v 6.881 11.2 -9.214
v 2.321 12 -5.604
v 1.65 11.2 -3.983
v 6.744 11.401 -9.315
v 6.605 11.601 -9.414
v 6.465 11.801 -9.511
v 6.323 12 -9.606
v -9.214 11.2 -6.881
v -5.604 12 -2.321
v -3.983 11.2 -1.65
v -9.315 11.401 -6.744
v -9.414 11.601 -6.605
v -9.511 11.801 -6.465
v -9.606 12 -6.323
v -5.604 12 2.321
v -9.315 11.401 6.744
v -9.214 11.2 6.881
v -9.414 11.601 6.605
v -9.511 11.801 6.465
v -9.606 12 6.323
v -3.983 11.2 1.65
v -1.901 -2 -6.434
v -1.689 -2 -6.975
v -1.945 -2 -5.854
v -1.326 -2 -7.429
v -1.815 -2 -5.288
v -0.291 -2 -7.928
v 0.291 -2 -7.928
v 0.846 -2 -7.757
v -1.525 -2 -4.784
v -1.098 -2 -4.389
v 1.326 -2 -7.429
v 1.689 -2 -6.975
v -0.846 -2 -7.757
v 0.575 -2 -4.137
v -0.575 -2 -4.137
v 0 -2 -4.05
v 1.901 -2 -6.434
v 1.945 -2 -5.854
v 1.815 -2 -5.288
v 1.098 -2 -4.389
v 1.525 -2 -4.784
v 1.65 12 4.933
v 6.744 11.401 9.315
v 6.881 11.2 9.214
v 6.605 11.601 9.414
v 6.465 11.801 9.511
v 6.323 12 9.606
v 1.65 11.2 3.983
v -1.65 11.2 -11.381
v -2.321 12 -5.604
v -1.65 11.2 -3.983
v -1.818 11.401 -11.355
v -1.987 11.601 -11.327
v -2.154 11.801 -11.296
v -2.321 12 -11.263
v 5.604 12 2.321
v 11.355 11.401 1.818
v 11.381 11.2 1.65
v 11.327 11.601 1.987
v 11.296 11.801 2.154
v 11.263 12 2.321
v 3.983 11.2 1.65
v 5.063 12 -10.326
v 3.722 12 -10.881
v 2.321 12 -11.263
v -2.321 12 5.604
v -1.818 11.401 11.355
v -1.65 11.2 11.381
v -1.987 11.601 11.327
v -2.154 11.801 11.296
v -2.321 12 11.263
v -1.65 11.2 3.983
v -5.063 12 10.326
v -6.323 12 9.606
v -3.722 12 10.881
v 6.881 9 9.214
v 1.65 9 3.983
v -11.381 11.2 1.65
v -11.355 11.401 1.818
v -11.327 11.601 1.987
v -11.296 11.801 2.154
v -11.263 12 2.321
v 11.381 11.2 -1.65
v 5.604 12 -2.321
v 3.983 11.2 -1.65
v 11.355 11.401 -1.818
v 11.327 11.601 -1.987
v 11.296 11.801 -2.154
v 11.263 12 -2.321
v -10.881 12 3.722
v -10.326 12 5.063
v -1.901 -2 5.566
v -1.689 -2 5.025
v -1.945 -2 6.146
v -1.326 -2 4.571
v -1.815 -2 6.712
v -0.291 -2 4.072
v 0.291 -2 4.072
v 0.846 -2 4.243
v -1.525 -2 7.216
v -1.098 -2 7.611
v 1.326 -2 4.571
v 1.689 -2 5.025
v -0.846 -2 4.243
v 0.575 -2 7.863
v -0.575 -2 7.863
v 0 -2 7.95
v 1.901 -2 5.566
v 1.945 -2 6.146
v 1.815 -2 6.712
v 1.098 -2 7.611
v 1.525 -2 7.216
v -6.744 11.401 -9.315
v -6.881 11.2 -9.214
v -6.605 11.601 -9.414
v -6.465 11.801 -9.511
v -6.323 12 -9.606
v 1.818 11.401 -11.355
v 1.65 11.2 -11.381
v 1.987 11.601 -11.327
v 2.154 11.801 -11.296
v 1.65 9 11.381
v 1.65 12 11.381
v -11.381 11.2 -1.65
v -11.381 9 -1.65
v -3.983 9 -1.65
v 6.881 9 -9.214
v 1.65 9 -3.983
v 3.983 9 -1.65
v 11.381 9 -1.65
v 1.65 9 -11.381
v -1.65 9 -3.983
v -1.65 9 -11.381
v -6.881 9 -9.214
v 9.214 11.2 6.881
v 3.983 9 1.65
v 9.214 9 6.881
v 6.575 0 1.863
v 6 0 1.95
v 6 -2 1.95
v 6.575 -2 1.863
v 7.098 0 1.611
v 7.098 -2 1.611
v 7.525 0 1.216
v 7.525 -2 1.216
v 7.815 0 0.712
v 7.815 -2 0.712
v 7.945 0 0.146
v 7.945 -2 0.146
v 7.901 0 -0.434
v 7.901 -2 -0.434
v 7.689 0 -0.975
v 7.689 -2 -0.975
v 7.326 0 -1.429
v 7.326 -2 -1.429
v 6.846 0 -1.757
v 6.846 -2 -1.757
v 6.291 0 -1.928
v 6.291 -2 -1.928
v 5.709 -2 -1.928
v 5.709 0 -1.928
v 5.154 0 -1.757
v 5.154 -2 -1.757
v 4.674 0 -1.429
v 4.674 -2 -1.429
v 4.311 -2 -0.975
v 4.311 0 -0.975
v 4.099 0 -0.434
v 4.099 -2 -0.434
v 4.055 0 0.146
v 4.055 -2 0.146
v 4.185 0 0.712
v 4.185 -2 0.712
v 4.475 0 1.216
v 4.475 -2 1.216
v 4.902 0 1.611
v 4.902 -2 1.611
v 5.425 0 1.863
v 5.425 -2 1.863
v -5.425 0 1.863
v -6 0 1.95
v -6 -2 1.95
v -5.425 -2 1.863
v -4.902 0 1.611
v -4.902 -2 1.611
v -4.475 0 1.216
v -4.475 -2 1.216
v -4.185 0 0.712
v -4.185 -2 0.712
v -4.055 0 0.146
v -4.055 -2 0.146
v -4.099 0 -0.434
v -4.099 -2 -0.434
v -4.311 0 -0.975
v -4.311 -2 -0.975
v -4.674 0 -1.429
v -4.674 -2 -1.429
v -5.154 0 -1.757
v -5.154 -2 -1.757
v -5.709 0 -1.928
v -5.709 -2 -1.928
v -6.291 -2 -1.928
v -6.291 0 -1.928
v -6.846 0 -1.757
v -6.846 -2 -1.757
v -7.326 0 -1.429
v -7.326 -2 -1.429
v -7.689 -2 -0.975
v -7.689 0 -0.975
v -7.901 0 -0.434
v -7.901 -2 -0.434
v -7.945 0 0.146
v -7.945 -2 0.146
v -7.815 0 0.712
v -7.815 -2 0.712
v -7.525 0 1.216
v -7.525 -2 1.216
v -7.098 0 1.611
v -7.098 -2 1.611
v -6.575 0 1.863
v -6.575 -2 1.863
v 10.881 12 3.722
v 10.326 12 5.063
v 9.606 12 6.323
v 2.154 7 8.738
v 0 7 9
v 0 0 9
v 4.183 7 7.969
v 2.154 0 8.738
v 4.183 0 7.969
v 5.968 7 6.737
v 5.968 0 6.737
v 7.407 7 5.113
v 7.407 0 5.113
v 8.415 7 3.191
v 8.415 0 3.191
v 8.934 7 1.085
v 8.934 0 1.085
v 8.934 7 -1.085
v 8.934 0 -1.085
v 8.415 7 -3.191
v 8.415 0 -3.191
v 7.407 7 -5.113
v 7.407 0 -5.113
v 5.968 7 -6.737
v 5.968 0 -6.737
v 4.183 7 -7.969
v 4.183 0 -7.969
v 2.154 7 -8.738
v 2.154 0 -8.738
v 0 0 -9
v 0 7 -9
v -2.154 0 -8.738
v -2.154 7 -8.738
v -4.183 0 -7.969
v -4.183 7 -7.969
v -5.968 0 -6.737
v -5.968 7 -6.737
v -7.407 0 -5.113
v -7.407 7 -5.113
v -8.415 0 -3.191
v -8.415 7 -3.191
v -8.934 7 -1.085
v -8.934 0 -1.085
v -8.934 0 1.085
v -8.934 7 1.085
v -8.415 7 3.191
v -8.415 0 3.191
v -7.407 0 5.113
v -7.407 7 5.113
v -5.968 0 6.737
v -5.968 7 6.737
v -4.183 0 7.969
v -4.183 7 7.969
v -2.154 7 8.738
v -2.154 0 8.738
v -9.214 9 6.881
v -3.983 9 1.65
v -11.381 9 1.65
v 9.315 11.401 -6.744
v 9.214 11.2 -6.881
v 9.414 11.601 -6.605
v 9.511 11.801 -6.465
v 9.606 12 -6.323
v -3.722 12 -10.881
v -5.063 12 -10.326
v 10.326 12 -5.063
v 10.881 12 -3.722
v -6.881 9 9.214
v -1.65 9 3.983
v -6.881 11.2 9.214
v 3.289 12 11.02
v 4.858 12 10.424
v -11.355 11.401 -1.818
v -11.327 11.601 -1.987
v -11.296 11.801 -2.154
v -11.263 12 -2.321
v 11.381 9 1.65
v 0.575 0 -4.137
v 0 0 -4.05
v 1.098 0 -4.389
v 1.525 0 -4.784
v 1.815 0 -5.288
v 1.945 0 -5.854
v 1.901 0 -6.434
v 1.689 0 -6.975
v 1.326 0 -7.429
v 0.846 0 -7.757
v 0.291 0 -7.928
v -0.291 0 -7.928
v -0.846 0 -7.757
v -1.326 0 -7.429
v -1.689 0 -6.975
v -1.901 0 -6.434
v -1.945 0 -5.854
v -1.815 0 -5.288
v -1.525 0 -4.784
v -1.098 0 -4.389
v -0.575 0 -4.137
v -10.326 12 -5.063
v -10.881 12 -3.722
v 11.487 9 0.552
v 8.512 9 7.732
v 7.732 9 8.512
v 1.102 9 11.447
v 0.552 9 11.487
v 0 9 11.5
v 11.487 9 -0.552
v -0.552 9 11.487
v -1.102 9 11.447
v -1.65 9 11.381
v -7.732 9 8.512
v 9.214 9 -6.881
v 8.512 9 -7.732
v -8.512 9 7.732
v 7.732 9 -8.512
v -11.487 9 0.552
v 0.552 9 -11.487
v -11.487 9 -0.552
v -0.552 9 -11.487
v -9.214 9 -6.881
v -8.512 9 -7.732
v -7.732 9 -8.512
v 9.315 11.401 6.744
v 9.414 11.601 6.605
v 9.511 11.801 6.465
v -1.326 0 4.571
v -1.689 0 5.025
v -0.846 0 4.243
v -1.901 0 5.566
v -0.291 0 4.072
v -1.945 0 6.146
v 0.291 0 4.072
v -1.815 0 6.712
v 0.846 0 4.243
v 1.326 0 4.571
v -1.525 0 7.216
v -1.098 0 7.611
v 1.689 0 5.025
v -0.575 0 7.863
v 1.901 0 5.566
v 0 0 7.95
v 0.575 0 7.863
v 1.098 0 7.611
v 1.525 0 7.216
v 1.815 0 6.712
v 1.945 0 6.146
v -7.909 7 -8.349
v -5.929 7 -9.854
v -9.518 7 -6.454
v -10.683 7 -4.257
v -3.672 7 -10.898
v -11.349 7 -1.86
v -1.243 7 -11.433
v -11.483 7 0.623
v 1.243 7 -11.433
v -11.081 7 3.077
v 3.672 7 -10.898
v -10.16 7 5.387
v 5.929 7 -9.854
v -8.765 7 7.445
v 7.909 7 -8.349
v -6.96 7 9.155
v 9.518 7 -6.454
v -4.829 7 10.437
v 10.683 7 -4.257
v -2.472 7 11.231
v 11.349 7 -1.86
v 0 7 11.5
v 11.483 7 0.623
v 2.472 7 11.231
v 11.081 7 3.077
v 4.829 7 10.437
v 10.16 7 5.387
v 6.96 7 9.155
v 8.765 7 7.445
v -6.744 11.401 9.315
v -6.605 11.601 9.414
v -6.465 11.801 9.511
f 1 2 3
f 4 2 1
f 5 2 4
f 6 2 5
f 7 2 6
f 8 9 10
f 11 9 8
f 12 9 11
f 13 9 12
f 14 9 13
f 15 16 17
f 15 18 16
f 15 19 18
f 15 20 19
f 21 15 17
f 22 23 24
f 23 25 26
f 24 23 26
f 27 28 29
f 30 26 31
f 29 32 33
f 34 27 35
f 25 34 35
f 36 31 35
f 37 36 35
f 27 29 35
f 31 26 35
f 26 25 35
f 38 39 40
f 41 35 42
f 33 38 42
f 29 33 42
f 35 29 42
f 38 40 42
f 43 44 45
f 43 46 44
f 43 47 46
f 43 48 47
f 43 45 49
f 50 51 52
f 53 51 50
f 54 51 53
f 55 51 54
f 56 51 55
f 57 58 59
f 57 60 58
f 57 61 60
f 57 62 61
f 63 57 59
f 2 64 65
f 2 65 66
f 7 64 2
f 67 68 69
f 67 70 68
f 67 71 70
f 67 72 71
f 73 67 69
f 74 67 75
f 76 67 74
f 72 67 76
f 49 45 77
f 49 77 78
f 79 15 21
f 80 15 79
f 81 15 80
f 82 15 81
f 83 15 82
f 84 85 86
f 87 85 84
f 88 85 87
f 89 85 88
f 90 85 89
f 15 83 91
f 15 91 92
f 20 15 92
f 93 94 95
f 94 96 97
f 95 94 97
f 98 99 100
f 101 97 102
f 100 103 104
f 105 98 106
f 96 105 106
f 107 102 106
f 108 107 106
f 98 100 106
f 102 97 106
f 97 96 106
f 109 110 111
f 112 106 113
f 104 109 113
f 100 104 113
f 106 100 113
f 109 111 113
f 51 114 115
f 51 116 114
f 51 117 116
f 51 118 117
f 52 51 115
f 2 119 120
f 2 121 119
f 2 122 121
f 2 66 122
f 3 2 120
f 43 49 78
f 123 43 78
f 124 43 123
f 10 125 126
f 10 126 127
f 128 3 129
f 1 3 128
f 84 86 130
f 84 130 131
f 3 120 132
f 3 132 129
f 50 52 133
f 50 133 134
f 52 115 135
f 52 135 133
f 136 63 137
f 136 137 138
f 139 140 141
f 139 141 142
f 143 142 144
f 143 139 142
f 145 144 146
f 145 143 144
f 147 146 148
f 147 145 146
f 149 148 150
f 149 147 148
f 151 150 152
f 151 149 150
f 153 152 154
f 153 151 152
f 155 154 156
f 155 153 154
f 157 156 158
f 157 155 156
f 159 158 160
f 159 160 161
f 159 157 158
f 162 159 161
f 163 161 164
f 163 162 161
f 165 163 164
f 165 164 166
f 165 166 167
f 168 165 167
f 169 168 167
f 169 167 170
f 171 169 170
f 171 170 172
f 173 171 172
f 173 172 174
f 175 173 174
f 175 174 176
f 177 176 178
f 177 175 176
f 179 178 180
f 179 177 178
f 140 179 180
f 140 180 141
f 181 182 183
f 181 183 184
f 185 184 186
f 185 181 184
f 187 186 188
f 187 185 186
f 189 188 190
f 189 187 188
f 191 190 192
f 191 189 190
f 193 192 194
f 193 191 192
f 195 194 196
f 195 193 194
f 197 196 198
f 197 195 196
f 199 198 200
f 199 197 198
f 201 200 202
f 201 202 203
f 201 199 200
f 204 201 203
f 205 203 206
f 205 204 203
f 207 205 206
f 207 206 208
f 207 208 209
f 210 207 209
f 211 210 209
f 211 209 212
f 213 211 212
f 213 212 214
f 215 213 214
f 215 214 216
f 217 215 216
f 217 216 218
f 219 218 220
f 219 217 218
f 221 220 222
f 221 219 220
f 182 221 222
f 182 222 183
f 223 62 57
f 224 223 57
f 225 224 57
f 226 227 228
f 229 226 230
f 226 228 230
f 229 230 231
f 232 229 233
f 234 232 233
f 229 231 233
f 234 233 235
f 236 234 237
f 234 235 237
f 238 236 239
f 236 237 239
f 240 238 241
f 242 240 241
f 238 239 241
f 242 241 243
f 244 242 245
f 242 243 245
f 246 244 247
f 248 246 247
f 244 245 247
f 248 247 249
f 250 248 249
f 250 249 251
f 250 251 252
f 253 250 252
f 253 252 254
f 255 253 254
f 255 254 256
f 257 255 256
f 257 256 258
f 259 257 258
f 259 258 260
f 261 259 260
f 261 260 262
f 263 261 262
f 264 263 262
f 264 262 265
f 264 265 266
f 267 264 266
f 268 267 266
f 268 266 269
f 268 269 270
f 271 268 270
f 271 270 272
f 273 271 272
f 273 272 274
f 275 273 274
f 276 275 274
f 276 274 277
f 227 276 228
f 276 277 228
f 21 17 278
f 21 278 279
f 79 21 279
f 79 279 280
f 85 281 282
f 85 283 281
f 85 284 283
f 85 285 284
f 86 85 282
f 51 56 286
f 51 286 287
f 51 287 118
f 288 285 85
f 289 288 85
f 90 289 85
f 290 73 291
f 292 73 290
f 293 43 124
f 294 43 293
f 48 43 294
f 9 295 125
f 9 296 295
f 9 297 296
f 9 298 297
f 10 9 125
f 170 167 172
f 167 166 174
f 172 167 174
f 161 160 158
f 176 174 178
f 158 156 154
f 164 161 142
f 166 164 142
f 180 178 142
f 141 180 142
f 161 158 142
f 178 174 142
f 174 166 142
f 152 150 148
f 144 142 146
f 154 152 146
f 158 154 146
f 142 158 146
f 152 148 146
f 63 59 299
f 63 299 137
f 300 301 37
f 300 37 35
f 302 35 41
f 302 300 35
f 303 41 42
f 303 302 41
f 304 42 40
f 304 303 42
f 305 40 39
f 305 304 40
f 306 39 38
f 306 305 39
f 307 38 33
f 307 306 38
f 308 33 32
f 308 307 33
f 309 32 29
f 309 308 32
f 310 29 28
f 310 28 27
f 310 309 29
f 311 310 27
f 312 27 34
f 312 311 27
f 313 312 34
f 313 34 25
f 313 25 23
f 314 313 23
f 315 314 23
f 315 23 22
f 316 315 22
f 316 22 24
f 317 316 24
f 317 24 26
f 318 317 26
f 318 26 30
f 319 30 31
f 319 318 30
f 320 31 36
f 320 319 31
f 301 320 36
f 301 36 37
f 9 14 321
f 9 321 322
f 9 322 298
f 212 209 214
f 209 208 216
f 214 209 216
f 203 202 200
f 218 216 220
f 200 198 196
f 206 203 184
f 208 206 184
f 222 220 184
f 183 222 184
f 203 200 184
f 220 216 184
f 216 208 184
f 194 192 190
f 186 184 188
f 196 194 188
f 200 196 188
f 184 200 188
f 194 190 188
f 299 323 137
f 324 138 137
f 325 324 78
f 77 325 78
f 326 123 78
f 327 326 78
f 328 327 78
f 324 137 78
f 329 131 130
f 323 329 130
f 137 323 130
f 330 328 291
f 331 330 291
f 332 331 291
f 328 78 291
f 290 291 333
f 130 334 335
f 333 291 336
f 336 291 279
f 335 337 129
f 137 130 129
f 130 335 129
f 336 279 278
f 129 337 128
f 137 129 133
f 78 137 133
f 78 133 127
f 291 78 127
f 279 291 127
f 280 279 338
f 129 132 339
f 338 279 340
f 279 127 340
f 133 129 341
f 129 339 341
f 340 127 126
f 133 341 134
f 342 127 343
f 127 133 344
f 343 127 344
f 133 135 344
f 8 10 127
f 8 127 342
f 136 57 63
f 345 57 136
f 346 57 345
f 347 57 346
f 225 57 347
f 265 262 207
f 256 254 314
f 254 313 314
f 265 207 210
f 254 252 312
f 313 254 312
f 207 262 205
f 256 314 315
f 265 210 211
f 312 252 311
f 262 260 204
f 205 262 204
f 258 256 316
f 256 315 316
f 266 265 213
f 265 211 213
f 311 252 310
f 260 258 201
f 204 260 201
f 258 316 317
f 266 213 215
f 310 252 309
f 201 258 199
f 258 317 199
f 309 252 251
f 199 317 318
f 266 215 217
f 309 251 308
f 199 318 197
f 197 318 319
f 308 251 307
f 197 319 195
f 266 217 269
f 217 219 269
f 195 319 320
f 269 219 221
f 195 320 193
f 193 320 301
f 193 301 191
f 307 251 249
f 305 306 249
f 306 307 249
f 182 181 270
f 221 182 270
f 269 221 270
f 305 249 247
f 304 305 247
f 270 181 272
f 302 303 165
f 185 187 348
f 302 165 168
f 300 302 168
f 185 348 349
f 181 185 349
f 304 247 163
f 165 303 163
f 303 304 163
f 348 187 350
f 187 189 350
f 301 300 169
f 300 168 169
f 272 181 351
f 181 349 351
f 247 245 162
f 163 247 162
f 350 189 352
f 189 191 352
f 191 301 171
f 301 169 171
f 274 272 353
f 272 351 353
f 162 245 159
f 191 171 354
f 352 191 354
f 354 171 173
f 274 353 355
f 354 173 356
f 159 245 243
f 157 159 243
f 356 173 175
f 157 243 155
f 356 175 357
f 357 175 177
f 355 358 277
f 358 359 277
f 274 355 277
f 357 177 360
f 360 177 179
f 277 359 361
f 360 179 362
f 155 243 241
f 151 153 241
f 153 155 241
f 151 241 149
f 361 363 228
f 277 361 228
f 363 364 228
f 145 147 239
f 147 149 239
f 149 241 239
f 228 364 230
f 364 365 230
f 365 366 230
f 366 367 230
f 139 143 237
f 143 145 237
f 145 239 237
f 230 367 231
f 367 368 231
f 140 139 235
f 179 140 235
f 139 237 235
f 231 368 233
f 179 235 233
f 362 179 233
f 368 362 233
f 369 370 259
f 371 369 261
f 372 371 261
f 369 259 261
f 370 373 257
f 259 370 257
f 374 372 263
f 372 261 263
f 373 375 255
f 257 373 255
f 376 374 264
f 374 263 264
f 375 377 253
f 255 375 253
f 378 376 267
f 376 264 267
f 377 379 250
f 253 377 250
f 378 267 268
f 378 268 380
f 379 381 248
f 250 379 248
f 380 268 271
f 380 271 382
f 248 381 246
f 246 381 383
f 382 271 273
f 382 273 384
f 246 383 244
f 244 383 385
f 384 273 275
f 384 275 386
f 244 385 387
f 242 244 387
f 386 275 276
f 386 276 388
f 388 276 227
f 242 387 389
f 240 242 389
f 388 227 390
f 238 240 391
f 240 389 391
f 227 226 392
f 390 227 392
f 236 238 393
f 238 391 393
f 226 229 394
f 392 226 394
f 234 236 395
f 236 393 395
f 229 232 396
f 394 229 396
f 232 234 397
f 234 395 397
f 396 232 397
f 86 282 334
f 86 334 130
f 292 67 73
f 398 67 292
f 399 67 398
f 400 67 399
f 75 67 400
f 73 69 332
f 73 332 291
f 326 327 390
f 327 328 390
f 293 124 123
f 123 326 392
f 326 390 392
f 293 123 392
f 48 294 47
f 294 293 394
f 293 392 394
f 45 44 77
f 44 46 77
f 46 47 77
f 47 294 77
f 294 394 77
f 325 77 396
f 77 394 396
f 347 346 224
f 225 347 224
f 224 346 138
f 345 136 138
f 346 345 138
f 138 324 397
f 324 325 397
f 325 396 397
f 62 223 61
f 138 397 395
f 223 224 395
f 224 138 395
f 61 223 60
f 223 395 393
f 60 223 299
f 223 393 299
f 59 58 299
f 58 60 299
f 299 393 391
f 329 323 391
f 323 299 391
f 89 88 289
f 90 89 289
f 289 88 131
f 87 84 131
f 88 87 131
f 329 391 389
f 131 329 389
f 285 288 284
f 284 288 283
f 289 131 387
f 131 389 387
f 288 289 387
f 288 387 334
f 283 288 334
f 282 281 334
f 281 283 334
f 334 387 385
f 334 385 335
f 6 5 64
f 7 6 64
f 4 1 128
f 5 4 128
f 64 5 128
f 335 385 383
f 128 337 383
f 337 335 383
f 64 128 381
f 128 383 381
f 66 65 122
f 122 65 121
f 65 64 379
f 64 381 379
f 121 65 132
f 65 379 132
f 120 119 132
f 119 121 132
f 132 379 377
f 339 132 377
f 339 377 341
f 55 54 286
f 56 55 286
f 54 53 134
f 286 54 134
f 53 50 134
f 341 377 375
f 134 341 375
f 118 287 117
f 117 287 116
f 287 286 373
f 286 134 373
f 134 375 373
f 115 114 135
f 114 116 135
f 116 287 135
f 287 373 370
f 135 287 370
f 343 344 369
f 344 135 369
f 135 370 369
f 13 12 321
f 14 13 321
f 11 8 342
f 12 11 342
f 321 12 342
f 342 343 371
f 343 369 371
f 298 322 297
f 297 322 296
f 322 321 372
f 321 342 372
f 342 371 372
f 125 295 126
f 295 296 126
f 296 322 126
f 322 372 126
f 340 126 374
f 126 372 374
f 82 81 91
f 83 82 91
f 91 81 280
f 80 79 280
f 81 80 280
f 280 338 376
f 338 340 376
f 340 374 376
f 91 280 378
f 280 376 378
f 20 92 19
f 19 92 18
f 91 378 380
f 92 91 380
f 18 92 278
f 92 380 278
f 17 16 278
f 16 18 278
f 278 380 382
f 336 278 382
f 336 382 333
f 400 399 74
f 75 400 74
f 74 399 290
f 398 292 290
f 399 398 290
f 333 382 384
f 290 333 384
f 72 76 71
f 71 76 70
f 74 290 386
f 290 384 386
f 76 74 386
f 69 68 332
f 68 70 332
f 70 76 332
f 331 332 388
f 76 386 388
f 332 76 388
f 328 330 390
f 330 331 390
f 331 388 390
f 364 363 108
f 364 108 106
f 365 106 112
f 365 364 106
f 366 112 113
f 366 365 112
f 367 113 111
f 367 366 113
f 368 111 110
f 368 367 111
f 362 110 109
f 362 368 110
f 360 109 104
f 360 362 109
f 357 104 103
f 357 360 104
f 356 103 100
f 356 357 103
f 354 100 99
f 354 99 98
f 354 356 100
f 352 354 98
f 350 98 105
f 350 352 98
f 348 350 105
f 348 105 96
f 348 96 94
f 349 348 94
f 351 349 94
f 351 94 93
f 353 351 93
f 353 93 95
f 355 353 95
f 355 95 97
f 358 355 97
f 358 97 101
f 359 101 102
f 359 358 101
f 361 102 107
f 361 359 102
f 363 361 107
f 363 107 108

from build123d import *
from OCP.BRepFilletAPI import BRepFilletAPI_MakeChamfer

# Parameters (mm, degrees)
SKETCH1_R           = 9
BOSS_EXTRUDE1_DEPTH = 12
SKETCH1_3_R         = 1.95
BOSS_EXTRUDE2_DEPTH = 2
BOSS_EXTRUDE3_START = -5
SKETCH4_R           = 11.5
SKETCH4_R_2         = 9
BOSS_EXTRUDE3_DEPTH = 5
CUT_EXTRUDE2_DEPTH  = 3
CHAMFER1_SIZE       = 0.8
CHAMFER1_SIZE2      = 0.671279705


with BuildPart() as part:
    # Sketch1 → Boss-Extrude1 (new body)
    with BuildSketch(Plane(origin=(0, 0, 0), x_dir=(1, 0, 0), z_dir=(0, 1, 0))):
        Circle(SKETCH1_R)
    extrude(amount=BOSS_EXTRUDE1_DEPTH)

    # Sketch1<3> → Boss-Extrude2 (add)
    with BuildSketch(Plane(origin=(0, 0, 0), x_dir=(1, 0, 0), z_dir=(0, 1, 0))):
        with Locations((-6, 0)):
            Circle(SKETCH1_3_R)
        with Locations((0, 6)):
            Circle(SKETCH1_3_R)
        with Locations((6, 0)):
            Circle(SKETCH1_3_R)
        with Locations((0, -6)):
            Circle(SKETCH1_3_R)
    extrude(amount=-BOSS_EXTRUDE2_DEPTH)

    # Sketch4 → Boss-Extrude3 (add)
    with BuildSketch(Plane(origin=(0, 12, 0), x_dir=(1, 0, 0), z_dir=(0, 1, 0)).offset(BOSS_EXTRUDE3_START)):
        Circle(SKETCH4_R)
        Circle(SKETCH4_R_2, mode=Mode.SUBTRACT)
    extrude(amount=BOSS_EXTRUDE3_DEPTH)

    # Sketch3 → Cut-Extrude2 (cut)
    with BuildSketch(Plane(origin=(0, 12, 0), x_dir=(1, 0, 0), z_dir=(0, 1, 0))):
        with BuildLine():
            Line((1.65, 3.983452378), (1.65, 12.188826851))
            ThreePointArc((1.65, 12.188826851), (0, 12.3), (-1.65, 12.188826851))
            Line((-1.65, 12.188826851), (-1.65, 3.983452378))
            Line((-1.65, 3.983452378), (-7.452075932, 9.78552831))
            ThreePointArc((-7.452075932, 9.78552831), (-8.697413409, 8.697413409), (-9.78552831, 7.452075932))
            Line((-9.78552831, 7.452075932), (-3.983452378, 1.65))
            Line((-3.983452378, 1.65), (-12.188826851, 1.65))
            ThreePointArc((-12.188826851, 1.65), (-12.3, 0), (-12.188826851, -1.65))
            Line((-12.188826851, -1.65), (-3.983452378, -1.65))
            Line((-3.983452378, -1.65), (-9.78552831, -7.452075932))
            ThreePointArc((-9.78552831, -7.452075932), (-8.697413409, -8.697413409), (-7.452075932, -9.78552831))
            Line((-7.452075932, -9.78552831), (-1.65, -3.983452378))
            Line((-1.65, -3.983452378), (-1.65, -12.188826851))
            ThreePointArc((-1.65, -12.188826851), (0, -12.3), (1.65, -12.188826851))
            Line((1.65, -12.188826851), (1.65, -3.983452378))
            Line((1.65, -3.983452378), (7.452075932, -9.78552831))
            ThreePointArc((7.452075932, -9.78552831), (8.697413409, -8.697413409), (9.78552831, -7.452075932))
            Line((9.78552831, -7.452075932), (3.983452378, -1.65))
            Line((3.983452378, -1.65), (12.188826851, -1.65))
            ThreePointArc((12.188826851, -1.65), (12.27217524, -0.826870526), (12.3, 0))
            ThreePointArc((12.3, 0), (12.27217524, 0.826870526), (12.188826851, 1.65))
            Line((12.188826851, 1.65), (3.983452378, 1.65))
            Line((3.983452378, 1.65), (9.78552831, 7.452075932))
            ThreePointArc((9.78552831, 7.452075932), (8.697413409, 8.697413409), (7.452075932, 9.78552831))
            Line((7.452075932, 9.78552831), (1.65, 3.983452378))
        make_face()
    extrude(amount=-CUT_EXTRUDE2_DEPTH, mode=Mode.SUBTRACT)

    # Chamfer1: one chamfer whose edges measure the first distance from different faces: ONE call of the kernel's chamfer builder (chamfer() names one face for all edges)
    chamfer1_edges_1 = [part.edges().sort_by_distance(p)[0] for p in [
        (-7.682233636, 12, 1.65),
    ]]
    chamfer1_side_1 = [part.faces().sort_by_distance(p)[0] for p in [
        (-7.682233636, 10.5, 1.65),
    ]]
    chamfer1_edges_2 = [part.edges().sort_by_distance(p)[0] for p in [
        (-6.598885687, 12, 4.265433309),
    ]]
    chamfer1_side_2 = [part.faces().sort_by_distance(p)[0] for p in [
        (-6.598885687, 10.5, 4.265433309),
    ]]
    chamfer1_edges_3 = [part.edges().sort_by_distance(p)[0] for p in [
        (-4.265433309, 12, 6.598885687),
    ]]
    chamfer1_side_3 = [part.faces().sort_by_distance(p)[0] for p in [
        (-4.265433309, 10.5, 6.598885687),
    ]]
    chamfer1_edges_4 = [part.edges().sort_by_distance(p)[0] for p in [
        (-1.65, 12, 7.682233636),
    ]]
    chamfer1_side_4 = [part.faces().sort_by_distance(p)[0] for p in [
        (-1.65, 10.5, 7.682233636),
    ]]
    chamfer1_edges_5 = [part.edges().sort_by_distance(p)[0] for p in [
        (4.265433309, 12, 6.598885687),
    ]]
    chamfer1_side_5 = [part.faces().sort_by_distance(p)[0] for p in [
        (4.265433309, 10.5, 6.598885687),
    ]]
    chamfer1_edges_6 = [part.edges().sort_by_distance(p)[0] for p in [
        (6.598885687, 12, 4.265433309),
    ]]
    chamfer1_side_6 = [part.faces().sort_by_distance(p)[0] for p in [
        (6.598885687, 10.5, 4.265433309),
    ]]
    chamfer1_edges_7 = [part.edges().sort_by_distance(p)[0] for p in [
        (7.682233636, 12, 1.65),
    ]]
    chamfer1_side_7 = [part.faces().sort_by_distance(p)[0] for p in [
        (7.682233636, 10.5, 1.65),
    ]]
    chamfer1_edges_8 = [part.edges().sort_by_distance(p)[0] for p in [
        (7.682233636, 12, -1.65),
    ]]
    chamfer1_side_8 = [part.faces().sort_by_distance(p)[0] for p in [
        (7.682233636, 10.5, -1.65),
    ]]
    chamfer1_edges_9 = [part.edges().sort_by_distance(p)[0] for p in [
        (6.598885687, 12, -4.265433309),
    ]]
    chamfer1_side_9 = [part.faces().sort_by_distance(p)[0] for p in [
        (6.598885687, 10.5, -4.265433309),
    ]]
    chamfer1_edges_10 = [part.edges().sort_by_distance(p)[0] for p in [
        (4.265433309, 12, -6.598885687),
    ]]
    chamfer1_side_10 = [part.faces().sort_by_distance(p)[0] for p in [
        (4.265433309, 10.5, -6.598885687),
    ]]
    chamfer1_edges_11 = [part.edges().sort_by_distance(p)[0] for p in [
        (1.65, 12, -7.682233636),
    ]]
    chamfer1_side_11 = [part.faces().sort_by_distance(p)[0] for p in [
        (1.65, 10.5, -7.682233636),
    ]]
    chamfer1_edges_12 = [part.edges().sort_by_distance(p)[0] for p in [
        (-1.65, 12, -7.682233636),
    ]]
    chamfer1_side_12 = [part.faces().sort_by_distance(p)[0] for p in [
        (-1.65, 10.5, -7.682233636),
    ]]
    chamfer1_edges_13 = [part.edges().sort_by_distance(p)[0] for p in [
        (-4.265433309, 12, -6.598885687),
    ]]
    chamfer1_side_13 = [part.faces().sort_by_distance(p)[0] for p in [
        (-4.265433309, 10.5, -6.598885687),
    ]]
    chamfer1_edges_14 = [part.edges().sort_by_distance(p)[0] for p in [
        (-7.682233636, 12, -1.65),
    ]]
    chamfer1_side_14 = [part.faces().sort_by_distance(p)[0] for p in [
        (-7.682233636, 10.5, -1.65),
    ]]
    chamfer1_edges_15 = [part.edges().sort_by_distance(p)[0] for p in [
        (-6.598885687, 12, -4.265433309),
    ]]
    chamfer1_side_15 = [part.faces().sort_by_distance(p)[0] for p in [
        (-6.598885687, 10.5, -4.265433309),
    ]]
    chamfer1 = BRepFilletAPI_MakeChamfer(part.part.solid().wrapped)
    for e in chamfer1_edges_1:
        chamfer1.Add(CHAMFER1_SIZE, CHAMFER1_SIZE2, e.wrapped, chamfer1_side_1[0].wrapped)  # the first distance lies on this face
    for e in chamfer1_edges_2:
        chamfer1.Add(CHAMFER1_SIZE, CHAMFER1_SIZE2, e.wrapped, chamfer1_side_2[0].wrapped)  # the first distance lies on this face
    for e in chamfer1_edges_3:
        chamfer1.Add(CHAMFER1_SIZE, CHAMFER1_SIZE2, e.wrapped, chamfer1_side_3[0].wrapped)  # the first distance lies on this face
    for e in chamfer1_edges_4:
        chamfer1.Add(CHAMFER1_SIZE, CHAMFER1_SIZE2, e.wrapped, chamfer1_side_4[0].wrapped)  # the first distance lies on this face
    for e in chamfer1_edges_5:
        chamfer1.Add(CHAMFER1_SIZE, CHAMFER1_SIZE2, e.wrapped, chamfer1_side_5[0].wrapped)  # the first distance lies on this face
    for e in chamfer1_edges_6:
        chamfer1.Add(CHAMFER1_SIZE, CHAMFER1_SIZE2, e.wrapped, chamfer1_side_6[0].wrapped)  # the first distance lies on this face
    for e in chamfer1_edges_7:
        chamfer1.Add(CHAMFER1_SIZE, CHAMFER1_SIZE2, e.wrapped, chamfer1_side_7[0].wrapped)  # the first distance lies on this face
    for e in chamfer1_edges_8:
        chamfer1.Add(CHAMFER1_SIZE, CHAMFER1_SIZE2, e.wrapped, chamfer1_side_8[0].wrapped)  # the first distance lies on this face
    for e in chamfer1_edges_9:
        chamfer1.Add(CHAMFER1_SIZE, CHAMFER1_SIZE2, e.wrapped, chamfer1_side_9[0].wrapped)  # the first distance lies on this face
    for e in chamfer1_edges_10:
        chamfer1.Add(CHAMFER1_SIZE, CHAMFER1_SIZE2, e.wrapped, chamfer1_side_10[0].wrapped)  # the first distance lies on this face
    for e in chamfer1_edges_11:
        chamfer1.Add(CHAMFER1_SIZE, CHAMFER1_SIZE2, e.wrapped, chamfer1_side_11[0].wrapped)  # the first distance lies on this face
    for e in chamfer1_edges_12:
        chamfer1.Add(CHAMFER1_SIZE, CHAMFER1_SIZE2, e.wrapped, chamfer1_side_12[0].wrapped)  # the first distance lies on this face
    for e in chamfer1_edges_13:
        chamfer1.Add(CHAMFER1_SIZE, CHAMFER1_SIZE2, e.wrapped, chamfer1_side_13[0].wrapped)  # the first distance lies on this face
    for e in chamfer1_edges_14:
        chamfer1.Add(CHAMFER1_SIZE, CHAMFER1_SIZE2, e.wrapped, chamfer1_side_14[0].wrapped)  # the first distance lies on this face
    for e in chamfer1_edges_15:
        chamfer1.Add(CHAMFER1_SIZE, CHAMFER1_SIZE2, e.wrapped, chamfer1_side_15[0].wrapped)  # the first distance lies on this face
    add(Compound.cast(chamfer1.Shape()), mode=Mode.REPLACE)


solid = part.part
